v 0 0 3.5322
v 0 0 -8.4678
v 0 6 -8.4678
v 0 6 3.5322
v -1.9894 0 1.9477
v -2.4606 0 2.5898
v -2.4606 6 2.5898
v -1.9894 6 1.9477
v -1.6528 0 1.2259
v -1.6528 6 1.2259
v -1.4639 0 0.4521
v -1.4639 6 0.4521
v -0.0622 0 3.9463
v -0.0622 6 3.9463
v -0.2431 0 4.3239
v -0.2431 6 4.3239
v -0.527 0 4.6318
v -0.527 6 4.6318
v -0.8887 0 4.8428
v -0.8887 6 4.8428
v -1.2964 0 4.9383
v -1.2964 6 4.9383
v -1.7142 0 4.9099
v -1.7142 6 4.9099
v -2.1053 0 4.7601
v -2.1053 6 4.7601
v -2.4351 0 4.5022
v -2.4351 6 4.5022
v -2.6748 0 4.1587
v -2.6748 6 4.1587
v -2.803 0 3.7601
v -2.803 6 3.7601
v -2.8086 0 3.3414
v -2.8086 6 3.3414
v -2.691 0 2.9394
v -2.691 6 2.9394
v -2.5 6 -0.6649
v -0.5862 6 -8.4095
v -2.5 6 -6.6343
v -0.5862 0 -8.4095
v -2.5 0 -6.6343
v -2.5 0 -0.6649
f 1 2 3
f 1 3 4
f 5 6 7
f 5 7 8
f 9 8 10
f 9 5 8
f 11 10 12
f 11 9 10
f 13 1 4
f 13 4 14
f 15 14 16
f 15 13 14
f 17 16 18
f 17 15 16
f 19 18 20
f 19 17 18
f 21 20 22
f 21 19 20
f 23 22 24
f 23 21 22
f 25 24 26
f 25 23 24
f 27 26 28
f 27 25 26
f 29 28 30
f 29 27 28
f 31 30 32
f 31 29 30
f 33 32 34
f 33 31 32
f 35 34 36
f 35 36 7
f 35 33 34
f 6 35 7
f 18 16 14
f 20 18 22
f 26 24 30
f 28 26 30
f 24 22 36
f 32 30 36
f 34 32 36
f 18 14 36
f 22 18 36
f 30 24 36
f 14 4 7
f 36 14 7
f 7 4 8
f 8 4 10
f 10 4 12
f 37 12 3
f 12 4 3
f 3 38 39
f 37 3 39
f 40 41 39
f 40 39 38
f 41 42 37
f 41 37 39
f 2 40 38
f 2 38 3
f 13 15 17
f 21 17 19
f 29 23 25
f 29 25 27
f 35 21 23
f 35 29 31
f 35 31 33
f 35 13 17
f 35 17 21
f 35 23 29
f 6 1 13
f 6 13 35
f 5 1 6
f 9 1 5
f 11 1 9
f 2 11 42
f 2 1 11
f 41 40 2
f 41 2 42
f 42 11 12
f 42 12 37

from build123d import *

# Parameters (mm, degrees)
BOSS_EXTRUDE1_DEPTH = 6


with BuildPart() as part:
    # Sketch1 → Boss-Extrude1 (new body)
    with BuildSketch(Plane(origin=(0, 0, 0), x_dir=(1, 0, 0), z_dir=(0, 1, 0))):
        with BuildLine():
            Line((0, 8.467832856), (0, -3.532167144))
            ThreePointArc((0, -3.532167144), (-1.915343114, -4.849607871), (-2.460583977, -2.589762364))
            ThreePointArc((-2.460583977, -2.589762364), (-1.803306785, -1.595054715), (-1.463898856, -0.452137887))
            Line((-1.463898856, -0.452137887), (-2.5, 0.664908658))
            Line((-2.5, 0.664908658), (-2.5, 6.634329976))
            Line((-2.5, 6.634329976), (-0.586152098, 8.409493247))
            Line((-0.586152098, 8.409493247), (0, 8.467832856))
        make_face()
    extrude(amount=BOSS_EXTRUDE1_DEPTH)


solid = part.part
